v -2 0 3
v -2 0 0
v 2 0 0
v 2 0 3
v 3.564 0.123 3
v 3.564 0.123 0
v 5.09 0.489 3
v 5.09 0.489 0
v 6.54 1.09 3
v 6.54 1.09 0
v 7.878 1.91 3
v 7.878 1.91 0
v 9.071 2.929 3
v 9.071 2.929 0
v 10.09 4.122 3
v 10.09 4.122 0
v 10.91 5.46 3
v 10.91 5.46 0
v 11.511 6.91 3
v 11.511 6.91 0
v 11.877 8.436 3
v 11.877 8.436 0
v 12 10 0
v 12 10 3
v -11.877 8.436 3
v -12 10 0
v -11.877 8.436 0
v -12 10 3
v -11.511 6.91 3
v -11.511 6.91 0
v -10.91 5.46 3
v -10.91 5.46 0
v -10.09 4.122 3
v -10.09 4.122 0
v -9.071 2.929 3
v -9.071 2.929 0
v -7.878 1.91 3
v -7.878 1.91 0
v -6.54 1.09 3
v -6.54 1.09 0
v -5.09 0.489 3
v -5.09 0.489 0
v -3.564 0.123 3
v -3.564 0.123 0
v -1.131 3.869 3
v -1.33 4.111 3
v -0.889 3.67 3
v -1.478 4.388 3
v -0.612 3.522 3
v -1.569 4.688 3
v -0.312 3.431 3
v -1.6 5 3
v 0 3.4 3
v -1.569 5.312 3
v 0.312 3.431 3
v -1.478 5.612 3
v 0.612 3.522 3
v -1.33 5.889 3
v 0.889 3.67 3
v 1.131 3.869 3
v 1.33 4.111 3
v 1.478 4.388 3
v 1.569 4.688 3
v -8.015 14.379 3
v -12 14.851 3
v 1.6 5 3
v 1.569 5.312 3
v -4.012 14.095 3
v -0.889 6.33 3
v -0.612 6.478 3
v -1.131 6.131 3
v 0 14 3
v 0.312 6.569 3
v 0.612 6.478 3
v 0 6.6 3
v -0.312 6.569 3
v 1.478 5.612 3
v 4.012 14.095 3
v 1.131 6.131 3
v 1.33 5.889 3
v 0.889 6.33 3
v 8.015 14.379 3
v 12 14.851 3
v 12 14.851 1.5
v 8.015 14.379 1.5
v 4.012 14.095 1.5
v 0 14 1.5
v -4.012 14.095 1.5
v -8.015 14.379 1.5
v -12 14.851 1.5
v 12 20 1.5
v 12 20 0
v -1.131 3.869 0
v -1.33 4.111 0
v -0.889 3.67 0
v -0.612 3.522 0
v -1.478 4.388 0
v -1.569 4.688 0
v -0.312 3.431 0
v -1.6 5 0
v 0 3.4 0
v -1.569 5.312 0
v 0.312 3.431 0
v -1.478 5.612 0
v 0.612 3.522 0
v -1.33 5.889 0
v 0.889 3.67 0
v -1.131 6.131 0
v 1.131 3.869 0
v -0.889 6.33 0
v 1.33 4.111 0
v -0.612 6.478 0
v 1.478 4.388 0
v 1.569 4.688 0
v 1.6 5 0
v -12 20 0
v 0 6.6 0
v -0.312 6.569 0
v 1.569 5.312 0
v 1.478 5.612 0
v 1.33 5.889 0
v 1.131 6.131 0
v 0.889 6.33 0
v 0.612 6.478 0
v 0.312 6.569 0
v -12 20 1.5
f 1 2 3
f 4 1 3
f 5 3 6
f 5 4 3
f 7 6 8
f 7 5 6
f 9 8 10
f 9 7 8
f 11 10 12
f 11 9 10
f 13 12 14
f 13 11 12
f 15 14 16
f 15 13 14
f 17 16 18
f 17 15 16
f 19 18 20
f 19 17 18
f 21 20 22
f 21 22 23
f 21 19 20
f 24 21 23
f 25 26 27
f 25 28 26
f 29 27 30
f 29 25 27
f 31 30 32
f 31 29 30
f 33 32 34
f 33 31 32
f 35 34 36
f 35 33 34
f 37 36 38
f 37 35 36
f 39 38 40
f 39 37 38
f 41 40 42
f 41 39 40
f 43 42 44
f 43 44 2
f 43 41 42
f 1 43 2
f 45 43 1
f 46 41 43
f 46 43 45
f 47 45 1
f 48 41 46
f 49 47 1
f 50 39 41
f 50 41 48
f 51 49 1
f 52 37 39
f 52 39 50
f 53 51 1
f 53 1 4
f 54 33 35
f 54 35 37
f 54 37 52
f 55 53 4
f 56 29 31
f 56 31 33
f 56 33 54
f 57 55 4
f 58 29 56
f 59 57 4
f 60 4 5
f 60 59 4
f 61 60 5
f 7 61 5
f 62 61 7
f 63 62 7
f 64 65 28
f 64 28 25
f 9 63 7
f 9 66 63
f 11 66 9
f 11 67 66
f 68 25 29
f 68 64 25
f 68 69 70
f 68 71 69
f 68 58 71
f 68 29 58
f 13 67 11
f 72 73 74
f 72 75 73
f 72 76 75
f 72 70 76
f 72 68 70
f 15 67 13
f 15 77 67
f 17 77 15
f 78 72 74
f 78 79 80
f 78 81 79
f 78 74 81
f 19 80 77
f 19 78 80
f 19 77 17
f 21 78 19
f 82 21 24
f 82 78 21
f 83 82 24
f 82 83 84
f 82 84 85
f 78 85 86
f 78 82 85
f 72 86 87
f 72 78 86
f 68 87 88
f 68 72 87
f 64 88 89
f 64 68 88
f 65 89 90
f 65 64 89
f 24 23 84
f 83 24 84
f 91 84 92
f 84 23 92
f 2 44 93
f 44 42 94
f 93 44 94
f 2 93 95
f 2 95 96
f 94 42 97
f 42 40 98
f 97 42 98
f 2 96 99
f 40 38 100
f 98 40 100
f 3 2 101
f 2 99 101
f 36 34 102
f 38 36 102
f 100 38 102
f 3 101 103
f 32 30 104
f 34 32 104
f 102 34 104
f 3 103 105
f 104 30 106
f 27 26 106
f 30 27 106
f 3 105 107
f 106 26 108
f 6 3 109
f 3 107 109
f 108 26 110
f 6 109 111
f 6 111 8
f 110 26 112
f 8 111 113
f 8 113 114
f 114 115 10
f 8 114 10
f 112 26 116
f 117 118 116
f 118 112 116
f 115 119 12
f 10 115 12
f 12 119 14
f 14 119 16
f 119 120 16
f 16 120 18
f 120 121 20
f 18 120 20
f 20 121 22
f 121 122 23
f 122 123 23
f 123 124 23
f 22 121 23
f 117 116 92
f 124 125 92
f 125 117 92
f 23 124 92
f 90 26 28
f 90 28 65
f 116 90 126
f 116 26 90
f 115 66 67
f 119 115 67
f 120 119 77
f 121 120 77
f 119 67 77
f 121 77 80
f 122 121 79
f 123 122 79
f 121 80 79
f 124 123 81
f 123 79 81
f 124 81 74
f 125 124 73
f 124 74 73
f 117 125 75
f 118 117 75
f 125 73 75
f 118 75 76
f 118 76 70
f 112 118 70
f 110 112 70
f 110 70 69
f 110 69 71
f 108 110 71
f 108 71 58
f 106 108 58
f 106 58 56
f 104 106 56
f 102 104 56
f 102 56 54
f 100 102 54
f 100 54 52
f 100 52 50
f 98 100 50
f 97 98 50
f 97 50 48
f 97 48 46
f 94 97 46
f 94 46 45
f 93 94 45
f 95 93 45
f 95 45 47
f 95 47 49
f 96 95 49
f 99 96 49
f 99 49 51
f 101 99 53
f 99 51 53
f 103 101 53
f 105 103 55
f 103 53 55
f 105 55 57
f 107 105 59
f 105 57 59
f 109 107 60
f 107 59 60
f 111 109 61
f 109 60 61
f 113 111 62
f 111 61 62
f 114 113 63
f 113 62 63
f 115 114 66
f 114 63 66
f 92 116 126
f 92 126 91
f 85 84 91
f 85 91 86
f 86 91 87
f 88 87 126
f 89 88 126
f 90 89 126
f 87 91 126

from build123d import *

# Parameters (mm, degrees)
SKETCH1_W           = 24
SKETCH1_H           = 20
BOSS_EXTRUDE1_DEPTH = 3
SKETCH3_R           = 1.6
CUT_EXTRUDE1_DEPTH  = 4
CUT_EXTRUDE2_DEPTH  = 1.5
FILLET1_R           = 10


with BuildPart() as part:
    # Sketch1 → Boss-Extrude1 (new body)
    with BuildSketch(Plane.XY):
        with Locations((0, 10)):
            Rectangle(SKETCH1_W, SKETCH1_H)
    extrude(amount=BOSS_EXTRUDE1_DEPTH)

    # Sketch3 → Cut-Extrude1 (cut, through all)
    with BuildSketch(Plane.XY.offset(3)):
        with Locations((0, 5)):
            Circle(SKETCH3_R)
    extrude(amount=-CUT_EXTRUDE1_DEPTH, mode=Mode.SUBTRACT)

    # Sketch2 → Cut-Extrude2 (cut)
    with BuildSketch(Plane.XY.offset(3)):
        with BuildLine():
            Line((-12, 14.851322054), (-12, 20))
            Line((-12, 20), (12, 20))
            Line((12, 20), (12, 14.851322054))
            ThreePointArc((12, 14.851322054), (0, 14), (-12, 14.851322054))
        make_face()
    extrude(amount=-CUT_EXTRUDE2_DEPTH, mode=Mode.SUBTRACT)

    # Fillet1
    fillet1_edges = [part.edges().sort_by_distance(p)[0] for p in [
        (12, 0, 1.5),
        (-12, 0, 1.5),
    ]]
    fillet(fillet1_edges, radius=FILLET1_R)


solid = part.part
